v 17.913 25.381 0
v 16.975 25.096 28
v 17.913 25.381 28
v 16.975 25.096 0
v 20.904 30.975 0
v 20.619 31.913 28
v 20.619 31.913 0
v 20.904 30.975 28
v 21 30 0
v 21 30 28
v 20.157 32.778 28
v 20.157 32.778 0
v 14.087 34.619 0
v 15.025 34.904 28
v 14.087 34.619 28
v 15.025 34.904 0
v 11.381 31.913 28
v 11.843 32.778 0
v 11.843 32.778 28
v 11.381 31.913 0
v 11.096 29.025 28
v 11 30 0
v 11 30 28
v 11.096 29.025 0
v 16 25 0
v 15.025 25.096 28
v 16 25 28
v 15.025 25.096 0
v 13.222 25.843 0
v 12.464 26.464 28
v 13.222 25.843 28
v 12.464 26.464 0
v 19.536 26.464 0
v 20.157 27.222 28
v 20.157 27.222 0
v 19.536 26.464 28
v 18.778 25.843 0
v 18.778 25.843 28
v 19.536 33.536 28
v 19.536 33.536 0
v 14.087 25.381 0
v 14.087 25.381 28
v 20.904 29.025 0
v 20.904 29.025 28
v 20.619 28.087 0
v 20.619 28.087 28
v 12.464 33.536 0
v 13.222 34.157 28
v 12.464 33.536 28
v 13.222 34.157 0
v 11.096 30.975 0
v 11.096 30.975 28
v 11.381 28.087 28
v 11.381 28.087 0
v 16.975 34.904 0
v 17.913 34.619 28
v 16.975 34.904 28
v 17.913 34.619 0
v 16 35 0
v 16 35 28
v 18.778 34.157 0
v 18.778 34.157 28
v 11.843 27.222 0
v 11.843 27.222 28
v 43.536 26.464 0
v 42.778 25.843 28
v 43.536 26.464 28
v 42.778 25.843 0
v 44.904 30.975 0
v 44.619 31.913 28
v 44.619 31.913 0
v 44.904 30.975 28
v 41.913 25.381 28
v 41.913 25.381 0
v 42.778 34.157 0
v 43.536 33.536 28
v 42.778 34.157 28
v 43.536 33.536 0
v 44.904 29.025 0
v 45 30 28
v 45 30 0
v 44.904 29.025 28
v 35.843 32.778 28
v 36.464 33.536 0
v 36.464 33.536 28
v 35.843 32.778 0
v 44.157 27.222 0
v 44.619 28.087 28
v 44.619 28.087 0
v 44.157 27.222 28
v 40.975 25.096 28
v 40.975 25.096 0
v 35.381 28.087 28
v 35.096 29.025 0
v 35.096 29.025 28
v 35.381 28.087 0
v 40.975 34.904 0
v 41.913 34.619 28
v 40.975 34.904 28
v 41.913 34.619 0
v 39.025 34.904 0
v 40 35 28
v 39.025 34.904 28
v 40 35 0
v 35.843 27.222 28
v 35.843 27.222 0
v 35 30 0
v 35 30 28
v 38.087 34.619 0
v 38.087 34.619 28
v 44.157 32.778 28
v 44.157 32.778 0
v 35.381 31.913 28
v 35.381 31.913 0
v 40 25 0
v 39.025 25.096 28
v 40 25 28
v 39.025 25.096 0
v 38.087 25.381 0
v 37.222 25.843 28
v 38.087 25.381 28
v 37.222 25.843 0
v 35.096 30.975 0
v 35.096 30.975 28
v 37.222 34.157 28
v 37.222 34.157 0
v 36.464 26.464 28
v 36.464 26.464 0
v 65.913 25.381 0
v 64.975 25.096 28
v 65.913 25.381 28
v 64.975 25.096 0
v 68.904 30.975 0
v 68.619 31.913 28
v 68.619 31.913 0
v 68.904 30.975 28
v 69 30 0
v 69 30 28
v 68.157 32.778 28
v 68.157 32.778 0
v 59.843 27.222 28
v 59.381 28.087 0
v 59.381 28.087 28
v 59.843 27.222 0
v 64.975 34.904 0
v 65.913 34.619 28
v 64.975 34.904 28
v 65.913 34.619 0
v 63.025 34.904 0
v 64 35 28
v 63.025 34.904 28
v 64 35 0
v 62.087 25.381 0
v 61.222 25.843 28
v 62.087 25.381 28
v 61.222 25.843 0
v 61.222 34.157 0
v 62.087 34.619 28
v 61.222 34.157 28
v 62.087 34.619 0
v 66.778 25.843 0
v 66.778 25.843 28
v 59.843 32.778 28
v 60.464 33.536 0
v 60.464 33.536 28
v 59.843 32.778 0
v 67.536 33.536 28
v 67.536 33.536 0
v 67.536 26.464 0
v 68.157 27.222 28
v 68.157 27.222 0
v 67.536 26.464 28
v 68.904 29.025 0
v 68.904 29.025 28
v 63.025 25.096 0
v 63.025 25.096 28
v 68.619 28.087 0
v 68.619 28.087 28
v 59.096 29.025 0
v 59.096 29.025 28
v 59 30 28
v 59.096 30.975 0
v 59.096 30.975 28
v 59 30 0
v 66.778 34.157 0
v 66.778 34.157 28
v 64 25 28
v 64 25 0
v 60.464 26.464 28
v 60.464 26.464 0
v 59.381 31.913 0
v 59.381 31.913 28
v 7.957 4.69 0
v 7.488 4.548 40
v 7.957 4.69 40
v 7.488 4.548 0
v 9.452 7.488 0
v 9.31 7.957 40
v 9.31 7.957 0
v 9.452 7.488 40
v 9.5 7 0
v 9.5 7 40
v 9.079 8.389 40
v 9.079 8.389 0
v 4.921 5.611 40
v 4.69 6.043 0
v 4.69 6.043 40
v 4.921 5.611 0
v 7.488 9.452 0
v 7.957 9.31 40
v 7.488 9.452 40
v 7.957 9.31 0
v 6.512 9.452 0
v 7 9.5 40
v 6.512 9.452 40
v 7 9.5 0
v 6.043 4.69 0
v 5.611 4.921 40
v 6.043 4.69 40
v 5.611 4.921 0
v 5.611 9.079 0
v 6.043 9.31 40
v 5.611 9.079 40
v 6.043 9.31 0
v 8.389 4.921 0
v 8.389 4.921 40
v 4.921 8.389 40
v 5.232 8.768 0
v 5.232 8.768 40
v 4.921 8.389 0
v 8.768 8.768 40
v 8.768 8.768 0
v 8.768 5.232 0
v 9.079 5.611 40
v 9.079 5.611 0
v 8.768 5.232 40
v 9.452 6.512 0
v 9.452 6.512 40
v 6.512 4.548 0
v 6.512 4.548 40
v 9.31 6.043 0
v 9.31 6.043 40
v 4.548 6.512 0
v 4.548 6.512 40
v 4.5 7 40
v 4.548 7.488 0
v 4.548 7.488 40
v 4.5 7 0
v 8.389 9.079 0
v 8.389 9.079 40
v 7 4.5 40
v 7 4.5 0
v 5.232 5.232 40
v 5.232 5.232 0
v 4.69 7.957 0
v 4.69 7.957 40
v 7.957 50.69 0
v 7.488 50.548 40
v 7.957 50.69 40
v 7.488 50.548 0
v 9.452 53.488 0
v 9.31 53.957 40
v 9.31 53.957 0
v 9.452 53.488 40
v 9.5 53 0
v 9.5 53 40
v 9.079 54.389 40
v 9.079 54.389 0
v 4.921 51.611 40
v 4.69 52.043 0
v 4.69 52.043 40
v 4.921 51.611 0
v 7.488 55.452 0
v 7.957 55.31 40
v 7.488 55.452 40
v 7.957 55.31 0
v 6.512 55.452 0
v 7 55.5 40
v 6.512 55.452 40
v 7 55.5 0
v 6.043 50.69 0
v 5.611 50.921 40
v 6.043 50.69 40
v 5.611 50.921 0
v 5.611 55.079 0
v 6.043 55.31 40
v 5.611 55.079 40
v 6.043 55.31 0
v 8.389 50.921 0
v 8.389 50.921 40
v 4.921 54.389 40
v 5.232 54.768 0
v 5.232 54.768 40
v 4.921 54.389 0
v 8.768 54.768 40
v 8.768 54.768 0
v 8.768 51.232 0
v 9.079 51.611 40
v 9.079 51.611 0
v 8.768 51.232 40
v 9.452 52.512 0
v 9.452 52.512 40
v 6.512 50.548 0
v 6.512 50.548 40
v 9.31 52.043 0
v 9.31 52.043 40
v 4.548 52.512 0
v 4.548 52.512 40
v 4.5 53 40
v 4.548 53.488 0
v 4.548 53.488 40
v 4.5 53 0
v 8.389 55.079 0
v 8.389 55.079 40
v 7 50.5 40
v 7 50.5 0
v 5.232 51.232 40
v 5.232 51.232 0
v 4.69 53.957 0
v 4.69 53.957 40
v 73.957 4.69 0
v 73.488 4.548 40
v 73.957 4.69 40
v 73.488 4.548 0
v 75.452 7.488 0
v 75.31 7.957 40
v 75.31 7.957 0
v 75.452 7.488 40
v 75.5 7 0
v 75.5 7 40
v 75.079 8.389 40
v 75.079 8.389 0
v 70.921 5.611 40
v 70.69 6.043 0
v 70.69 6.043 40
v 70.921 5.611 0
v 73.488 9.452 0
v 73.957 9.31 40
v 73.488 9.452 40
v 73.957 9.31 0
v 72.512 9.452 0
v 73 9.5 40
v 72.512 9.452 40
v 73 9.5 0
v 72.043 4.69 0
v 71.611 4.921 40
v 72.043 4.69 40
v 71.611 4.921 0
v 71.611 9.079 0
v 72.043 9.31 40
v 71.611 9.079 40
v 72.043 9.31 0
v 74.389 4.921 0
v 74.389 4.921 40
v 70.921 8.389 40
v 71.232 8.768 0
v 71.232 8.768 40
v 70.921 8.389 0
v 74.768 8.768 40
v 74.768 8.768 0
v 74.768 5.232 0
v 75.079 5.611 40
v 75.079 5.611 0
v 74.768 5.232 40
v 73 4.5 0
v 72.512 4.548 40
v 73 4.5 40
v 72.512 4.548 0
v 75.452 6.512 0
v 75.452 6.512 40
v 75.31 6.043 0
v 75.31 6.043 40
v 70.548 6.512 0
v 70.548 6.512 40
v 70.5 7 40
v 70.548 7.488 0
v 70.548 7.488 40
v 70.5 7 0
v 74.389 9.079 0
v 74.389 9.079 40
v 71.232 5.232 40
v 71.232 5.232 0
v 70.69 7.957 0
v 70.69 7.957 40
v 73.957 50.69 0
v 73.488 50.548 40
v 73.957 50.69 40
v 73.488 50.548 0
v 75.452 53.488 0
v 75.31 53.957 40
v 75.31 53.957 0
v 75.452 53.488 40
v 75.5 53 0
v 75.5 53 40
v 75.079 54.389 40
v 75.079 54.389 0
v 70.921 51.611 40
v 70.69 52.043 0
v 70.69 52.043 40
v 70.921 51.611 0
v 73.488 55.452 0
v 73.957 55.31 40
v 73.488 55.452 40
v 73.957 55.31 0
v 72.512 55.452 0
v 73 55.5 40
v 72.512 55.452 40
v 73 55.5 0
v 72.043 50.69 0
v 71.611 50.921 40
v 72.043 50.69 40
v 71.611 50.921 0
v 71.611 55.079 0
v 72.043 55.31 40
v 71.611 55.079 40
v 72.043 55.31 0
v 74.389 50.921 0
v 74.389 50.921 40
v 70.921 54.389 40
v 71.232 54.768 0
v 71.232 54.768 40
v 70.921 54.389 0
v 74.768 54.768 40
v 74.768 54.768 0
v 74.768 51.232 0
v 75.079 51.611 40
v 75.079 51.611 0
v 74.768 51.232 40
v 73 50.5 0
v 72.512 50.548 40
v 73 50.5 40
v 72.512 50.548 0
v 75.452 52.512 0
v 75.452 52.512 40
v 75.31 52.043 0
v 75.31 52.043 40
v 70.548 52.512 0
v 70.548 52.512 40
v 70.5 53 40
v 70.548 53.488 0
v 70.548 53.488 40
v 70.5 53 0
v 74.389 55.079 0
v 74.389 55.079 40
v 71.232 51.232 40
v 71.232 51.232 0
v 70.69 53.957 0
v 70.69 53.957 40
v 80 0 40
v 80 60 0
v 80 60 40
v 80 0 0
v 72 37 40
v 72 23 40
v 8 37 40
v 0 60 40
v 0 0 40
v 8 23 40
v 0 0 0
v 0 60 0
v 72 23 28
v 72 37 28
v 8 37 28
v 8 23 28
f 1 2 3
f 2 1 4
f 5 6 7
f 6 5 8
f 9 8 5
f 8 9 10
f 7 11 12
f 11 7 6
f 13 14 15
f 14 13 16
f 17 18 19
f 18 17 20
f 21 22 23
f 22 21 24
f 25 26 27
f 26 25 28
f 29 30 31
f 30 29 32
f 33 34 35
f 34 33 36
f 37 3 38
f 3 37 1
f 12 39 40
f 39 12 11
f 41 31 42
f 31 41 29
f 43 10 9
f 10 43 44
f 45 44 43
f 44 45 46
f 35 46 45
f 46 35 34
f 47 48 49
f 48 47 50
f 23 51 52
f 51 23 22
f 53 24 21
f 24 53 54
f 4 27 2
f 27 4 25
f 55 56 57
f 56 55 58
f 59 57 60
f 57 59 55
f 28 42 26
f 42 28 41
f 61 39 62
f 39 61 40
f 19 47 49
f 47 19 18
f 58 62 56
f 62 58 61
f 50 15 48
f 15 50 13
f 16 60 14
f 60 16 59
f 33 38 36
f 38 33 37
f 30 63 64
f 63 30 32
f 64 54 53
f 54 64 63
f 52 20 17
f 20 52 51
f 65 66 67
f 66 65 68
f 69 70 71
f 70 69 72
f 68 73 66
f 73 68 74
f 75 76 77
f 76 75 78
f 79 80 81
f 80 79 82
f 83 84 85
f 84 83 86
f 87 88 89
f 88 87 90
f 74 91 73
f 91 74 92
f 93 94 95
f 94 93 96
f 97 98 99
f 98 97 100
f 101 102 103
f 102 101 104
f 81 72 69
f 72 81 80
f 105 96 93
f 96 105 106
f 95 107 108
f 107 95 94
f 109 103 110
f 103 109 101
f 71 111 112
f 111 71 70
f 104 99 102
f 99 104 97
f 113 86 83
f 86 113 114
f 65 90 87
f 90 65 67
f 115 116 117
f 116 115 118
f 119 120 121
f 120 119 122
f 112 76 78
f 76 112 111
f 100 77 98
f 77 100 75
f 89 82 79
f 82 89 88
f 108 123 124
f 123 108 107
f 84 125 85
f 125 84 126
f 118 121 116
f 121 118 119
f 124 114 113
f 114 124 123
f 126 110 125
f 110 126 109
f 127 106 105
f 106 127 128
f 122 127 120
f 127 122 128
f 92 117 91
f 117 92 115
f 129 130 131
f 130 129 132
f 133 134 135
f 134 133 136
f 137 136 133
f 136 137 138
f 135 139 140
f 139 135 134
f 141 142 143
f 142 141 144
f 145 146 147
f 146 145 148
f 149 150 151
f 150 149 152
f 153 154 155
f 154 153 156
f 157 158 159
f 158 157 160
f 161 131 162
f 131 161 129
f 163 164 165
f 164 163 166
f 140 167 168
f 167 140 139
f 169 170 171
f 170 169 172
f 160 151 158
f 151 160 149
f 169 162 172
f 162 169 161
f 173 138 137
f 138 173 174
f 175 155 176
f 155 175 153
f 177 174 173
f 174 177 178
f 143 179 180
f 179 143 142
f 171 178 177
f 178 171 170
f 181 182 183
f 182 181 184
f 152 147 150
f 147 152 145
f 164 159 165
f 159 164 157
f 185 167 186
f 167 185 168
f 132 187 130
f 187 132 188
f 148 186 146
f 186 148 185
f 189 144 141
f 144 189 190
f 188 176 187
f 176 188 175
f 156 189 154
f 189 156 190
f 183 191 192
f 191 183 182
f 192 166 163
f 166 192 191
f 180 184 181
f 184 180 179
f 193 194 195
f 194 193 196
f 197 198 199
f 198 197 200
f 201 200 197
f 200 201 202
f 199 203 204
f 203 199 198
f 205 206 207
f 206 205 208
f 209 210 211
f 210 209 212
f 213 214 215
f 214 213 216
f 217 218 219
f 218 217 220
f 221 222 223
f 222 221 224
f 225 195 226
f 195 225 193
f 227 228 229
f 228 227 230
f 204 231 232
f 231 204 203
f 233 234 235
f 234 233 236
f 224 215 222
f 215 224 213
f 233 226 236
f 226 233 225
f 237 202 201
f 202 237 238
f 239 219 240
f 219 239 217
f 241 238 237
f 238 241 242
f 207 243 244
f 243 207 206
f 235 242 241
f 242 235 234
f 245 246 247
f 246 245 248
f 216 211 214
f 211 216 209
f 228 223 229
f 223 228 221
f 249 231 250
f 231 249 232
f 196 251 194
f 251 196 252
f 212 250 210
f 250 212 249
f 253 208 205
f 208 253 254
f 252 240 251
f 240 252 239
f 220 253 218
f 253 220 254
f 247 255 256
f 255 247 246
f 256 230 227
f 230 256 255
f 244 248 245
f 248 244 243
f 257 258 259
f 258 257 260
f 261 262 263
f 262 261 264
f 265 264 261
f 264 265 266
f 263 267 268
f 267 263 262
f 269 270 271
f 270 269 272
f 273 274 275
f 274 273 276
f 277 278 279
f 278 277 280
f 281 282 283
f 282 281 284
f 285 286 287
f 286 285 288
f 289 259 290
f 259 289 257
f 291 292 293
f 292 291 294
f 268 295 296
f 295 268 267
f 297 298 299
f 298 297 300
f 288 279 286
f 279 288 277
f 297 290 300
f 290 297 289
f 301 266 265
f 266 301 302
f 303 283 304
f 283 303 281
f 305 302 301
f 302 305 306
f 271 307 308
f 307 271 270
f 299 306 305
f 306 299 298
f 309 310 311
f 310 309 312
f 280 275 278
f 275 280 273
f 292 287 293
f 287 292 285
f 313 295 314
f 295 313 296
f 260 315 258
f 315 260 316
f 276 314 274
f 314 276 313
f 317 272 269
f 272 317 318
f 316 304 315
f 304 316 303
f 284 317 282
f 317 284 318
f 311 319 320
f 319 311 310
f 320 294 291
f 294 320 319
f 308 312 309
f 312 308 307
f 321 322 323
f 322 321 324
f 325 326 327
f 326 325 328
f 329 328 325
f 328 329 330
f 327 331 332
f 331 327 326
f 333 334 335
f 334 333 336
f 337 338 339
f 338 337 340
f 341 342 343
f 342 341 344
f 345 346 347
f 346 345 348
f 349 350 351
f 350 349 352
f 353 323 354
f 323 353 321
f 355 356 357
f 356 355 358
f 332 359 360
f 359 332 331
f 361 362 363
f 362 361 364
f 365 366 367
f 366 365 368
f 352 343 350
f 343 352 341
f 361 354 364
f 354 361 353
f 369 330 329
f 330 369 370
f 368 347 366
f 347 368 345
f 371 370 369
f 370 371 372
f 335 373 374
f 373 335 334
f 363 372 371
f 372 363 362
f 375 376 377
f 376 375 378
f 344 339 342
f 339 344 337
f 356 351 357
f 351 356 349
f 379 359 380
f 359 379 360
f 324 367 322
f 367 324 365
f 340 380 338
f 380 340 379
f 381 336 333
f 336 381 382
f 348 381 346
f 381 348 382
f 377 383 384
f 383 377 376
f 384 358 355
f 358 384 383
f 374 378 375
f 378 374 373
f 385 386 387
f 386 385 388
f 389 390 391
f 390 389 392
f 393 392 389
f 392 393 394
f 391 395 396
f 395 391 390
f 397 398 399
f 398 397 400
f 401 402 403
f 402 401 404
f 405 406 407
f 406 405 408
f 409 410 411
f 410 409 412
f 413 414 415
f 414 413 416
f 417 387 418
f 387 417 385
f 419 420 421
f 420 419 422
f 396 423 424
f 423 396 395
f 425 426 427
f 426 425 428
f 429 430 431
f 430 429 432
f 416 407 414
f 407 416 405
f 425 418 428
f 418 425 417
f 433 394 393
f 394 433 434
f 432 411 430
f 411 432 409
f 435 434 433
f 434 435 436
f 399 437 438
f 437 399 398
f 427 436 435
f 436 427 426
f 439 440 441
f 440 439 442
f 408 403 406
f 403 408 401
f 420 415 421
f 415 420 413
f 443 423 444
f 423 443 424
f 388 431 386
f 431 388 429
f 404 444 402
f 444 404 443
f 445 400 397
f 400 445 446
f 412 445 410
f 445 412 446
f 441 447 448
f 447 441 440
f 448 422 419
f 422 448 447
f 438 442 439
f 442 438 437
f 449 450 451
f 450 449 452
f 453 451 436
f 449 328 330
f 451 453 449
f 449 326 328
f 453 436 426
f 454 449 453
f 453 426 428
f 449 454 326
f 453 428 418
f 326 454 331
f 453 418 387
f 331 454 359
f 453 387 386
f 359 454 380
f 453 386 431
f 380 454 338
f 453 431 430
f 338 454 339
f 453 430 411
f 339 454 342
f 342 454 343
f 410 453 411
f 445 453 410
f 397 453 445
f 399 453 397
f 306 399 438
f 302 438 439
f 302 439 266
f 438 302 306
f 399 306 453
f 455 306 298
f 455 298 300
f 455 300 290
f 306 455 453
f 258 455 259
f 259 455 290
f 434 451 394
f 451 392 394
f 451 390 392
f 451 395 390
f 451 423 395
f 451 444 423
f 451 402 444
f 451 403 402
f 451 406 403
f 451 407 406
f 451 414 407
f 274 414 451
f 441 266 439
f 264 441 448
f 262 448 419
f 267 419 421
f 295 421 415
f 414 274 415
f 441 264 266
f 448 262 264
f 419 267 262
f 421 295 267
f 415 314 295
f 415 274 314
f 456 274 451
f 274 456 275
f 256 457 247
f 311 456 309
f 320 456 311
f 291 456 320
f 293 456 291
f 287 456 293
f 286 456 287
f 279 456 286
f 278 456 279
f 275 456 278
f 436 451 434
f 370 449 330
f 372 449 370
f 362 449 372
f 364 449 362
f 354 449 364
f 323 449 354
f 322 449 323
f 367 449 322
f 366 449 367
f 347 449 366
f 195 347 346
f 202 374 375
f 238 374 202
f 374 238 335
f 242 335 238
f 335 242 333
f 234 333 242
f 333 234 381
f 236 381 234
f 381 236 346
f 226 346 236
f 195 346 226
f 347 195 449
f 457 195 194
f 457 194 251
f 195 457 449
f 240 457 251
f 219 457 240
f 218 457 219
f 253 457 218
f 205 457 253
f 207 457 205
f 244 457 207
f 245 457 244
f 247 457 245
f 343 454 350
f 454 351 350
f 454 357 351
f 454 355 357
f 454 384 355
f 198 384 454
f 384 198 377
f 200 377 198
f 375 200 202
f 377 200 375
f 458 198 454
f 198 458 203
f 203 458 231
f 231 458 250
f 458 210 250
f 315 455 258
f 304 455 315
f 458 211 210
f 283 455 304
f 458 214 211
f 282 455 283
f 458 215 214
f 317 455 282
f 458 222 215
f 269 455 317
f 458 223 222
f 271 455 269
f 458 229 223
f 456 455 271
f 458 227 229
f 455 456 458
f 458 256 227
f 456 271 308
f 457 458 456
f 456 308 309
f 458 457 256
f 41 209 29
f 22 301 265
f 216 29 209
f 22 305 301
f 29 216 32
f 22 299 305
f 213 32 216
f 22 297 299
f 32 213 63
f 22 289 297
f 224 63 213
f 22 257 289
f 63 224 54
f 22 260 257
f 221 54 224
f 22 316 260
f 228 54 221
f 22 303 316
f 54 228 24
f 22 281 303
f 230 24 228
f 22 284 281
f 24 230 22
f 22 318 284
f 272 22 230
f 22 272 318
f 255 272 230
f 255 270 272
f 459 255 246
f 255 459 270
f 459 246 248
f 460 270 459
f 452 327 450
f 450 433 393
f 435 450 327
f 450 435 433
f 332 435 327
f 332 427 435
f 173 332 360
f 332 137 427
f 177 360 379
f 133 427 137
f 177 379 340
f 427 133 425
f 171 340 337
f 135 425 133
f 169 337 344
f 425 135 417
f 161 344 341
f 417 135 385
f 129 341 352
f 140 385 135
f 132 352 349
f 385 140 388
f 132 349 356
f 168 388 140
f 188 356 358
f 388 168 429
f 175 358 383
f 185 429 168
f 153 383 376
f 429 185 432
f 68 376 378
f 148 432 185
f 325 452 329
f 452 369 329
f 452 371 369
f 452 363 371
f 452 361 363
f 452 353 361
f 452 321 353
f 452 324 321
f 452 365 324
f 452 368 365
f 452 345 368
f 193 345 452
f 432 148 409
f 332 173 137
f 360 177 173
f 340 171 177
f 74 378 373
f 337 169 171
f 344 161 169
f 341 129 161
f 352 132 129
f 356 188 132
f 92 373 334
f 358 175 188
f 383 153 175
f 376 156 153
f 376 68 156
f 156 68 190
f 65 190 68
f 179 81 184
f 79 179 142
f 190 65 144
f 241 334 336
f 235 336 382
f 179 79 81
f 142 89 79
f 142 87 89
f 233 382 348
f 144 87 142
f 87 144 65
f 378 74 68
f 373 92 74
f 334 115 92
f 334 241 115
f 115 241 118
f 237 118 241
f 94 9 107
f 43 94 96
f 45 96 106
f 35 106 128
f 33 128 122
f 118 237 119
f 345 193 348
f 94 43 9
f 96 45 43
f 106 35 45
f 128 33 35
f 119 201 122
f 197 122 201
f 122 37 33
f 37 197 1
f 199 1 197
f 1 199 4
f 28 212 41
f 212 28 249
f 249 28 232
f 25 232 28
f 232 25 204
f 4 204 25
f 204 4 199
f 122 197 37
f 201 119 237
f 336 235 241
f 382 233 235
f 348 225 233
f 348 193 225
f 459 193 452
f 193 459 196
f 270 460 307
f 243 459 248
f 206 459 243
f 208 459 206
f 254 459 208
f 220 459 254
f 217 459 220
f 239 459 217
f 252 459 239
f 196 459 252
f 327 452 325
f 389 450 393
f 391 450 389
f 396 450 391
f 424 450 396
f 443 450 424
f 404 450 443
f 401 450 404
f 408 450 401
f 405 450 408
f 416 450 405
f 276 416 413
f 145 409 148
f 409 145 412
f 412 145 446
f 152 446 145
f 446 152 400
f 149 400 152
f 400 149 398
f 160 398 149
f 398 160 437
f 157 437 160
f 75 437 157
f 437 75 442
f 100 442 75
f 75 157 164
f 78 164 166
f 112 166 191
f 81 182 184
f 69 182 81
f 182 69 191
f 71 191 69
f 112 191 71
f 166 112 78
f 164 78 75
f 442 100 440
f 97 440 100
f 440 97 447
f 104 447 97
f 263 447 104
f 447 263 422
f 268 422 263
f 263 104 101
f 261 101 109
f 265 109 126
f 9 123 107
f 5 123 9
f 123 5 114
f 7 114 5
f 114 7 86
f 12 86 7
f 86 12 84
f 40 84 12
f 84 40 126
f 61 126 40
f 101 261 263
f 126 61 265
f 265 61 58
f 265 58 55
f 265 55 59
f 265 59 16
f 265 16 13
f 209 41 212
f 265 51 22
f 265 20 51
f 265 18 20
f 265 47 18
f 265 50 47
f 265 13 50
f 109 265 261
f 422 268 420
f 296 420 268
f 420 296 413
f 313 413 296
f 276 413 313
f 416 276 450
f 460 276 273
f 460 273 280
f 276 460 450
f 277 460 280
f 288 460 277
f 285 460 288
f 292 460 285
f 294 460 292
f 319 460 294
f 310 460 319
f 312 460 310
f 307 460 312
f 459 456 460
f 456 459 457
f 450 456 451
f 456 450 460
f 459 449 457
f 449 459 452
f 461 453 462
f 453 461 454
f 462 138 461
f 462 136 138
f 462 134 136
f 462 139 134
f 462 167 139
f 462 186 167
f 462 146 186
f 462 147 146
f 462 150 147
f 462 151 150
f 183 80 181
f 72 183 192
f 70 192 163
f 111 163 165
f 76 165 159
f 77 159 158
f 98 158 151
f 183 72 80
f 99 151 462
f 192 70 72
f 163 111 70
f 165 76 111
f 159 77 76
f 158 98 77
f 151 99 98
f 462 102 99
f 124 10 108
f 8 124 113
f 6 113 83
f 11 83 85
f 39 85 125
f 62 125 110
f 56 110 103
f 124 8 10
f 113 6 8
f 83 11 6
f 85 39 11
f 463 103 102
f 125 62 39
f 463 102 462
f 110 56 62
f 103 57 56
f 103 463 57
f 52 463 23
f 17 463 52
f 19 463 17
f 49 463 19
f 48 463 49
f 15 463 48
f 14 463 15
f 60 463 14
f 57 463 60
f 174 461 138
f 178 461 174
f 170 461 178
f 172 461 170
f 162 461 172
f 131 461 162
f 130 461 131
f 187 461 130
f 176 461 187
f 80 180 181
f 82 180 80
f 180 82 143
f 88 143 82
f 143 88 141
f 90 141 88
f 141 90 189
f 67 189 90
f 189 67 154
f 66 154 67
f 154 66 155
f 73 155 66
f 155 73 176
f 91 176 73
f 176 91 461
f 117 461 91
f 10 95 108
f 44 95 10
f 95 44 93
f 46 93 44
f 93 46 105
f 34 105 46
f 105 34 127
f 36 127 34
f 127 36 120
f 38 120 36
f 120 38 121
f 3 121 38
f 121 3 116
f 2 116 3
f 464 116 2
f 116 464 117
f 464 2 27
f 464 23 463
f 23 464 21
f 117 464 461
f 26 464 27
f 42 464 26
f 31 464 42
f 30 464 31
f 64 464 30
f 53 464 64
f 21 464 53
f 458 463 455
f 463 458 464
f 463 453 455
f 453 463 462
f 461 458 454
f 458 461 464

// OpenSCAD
$fn = 32;

// ----------------------------------------------------------------------
// Manifold block: gallery_top manifold
// ----------------------------------------------------------------------

// --- parameters (mm) ---
block_l = 80;             // block length, X
block_w = 60;             // block width, Y
block_h = 40;             // block height, Z
port_d = 10;              // port bore diameter
port_pitch = 24;          // port pitch along X
gallery_d = 14;           // top gallery width, Y
gallery_depth = 12;       // gallery pocket depth
wall_p = 8;               // gallery end wall thickness, X
mnt_d = 5;                // mounting hole diameter
mnt_in = 7;               // mounting hole inset from the edges

n_ports = 3;  // ports in the row
port_x0 = (block_l - (n_ports - 1) * port_pitch) / 2;  // first port X

difference() {
  cube([block_l, block_w, block_h]);
  for (i = [0 : n_ports - 1])
    translate([port_x0 + i * port_pitch, block_w / 2, -1])
      cylinder(h = block_h + 2, d = port_d);
  translate([wall_p, block_w / 2 - gallery_d / 2, block_h - gallery_depth])
    cube([block_l - 2 * wall_p, gallery_d, gallery_depth + 1]);
  for (cx = [mnt_in, block_l - mnt_in])
    for (cy = [mnt_in, block_w - mnt_in])
      translate([cx, cy, -1]) cylinder(h = block_h + 2, d = mnt_d);
}
